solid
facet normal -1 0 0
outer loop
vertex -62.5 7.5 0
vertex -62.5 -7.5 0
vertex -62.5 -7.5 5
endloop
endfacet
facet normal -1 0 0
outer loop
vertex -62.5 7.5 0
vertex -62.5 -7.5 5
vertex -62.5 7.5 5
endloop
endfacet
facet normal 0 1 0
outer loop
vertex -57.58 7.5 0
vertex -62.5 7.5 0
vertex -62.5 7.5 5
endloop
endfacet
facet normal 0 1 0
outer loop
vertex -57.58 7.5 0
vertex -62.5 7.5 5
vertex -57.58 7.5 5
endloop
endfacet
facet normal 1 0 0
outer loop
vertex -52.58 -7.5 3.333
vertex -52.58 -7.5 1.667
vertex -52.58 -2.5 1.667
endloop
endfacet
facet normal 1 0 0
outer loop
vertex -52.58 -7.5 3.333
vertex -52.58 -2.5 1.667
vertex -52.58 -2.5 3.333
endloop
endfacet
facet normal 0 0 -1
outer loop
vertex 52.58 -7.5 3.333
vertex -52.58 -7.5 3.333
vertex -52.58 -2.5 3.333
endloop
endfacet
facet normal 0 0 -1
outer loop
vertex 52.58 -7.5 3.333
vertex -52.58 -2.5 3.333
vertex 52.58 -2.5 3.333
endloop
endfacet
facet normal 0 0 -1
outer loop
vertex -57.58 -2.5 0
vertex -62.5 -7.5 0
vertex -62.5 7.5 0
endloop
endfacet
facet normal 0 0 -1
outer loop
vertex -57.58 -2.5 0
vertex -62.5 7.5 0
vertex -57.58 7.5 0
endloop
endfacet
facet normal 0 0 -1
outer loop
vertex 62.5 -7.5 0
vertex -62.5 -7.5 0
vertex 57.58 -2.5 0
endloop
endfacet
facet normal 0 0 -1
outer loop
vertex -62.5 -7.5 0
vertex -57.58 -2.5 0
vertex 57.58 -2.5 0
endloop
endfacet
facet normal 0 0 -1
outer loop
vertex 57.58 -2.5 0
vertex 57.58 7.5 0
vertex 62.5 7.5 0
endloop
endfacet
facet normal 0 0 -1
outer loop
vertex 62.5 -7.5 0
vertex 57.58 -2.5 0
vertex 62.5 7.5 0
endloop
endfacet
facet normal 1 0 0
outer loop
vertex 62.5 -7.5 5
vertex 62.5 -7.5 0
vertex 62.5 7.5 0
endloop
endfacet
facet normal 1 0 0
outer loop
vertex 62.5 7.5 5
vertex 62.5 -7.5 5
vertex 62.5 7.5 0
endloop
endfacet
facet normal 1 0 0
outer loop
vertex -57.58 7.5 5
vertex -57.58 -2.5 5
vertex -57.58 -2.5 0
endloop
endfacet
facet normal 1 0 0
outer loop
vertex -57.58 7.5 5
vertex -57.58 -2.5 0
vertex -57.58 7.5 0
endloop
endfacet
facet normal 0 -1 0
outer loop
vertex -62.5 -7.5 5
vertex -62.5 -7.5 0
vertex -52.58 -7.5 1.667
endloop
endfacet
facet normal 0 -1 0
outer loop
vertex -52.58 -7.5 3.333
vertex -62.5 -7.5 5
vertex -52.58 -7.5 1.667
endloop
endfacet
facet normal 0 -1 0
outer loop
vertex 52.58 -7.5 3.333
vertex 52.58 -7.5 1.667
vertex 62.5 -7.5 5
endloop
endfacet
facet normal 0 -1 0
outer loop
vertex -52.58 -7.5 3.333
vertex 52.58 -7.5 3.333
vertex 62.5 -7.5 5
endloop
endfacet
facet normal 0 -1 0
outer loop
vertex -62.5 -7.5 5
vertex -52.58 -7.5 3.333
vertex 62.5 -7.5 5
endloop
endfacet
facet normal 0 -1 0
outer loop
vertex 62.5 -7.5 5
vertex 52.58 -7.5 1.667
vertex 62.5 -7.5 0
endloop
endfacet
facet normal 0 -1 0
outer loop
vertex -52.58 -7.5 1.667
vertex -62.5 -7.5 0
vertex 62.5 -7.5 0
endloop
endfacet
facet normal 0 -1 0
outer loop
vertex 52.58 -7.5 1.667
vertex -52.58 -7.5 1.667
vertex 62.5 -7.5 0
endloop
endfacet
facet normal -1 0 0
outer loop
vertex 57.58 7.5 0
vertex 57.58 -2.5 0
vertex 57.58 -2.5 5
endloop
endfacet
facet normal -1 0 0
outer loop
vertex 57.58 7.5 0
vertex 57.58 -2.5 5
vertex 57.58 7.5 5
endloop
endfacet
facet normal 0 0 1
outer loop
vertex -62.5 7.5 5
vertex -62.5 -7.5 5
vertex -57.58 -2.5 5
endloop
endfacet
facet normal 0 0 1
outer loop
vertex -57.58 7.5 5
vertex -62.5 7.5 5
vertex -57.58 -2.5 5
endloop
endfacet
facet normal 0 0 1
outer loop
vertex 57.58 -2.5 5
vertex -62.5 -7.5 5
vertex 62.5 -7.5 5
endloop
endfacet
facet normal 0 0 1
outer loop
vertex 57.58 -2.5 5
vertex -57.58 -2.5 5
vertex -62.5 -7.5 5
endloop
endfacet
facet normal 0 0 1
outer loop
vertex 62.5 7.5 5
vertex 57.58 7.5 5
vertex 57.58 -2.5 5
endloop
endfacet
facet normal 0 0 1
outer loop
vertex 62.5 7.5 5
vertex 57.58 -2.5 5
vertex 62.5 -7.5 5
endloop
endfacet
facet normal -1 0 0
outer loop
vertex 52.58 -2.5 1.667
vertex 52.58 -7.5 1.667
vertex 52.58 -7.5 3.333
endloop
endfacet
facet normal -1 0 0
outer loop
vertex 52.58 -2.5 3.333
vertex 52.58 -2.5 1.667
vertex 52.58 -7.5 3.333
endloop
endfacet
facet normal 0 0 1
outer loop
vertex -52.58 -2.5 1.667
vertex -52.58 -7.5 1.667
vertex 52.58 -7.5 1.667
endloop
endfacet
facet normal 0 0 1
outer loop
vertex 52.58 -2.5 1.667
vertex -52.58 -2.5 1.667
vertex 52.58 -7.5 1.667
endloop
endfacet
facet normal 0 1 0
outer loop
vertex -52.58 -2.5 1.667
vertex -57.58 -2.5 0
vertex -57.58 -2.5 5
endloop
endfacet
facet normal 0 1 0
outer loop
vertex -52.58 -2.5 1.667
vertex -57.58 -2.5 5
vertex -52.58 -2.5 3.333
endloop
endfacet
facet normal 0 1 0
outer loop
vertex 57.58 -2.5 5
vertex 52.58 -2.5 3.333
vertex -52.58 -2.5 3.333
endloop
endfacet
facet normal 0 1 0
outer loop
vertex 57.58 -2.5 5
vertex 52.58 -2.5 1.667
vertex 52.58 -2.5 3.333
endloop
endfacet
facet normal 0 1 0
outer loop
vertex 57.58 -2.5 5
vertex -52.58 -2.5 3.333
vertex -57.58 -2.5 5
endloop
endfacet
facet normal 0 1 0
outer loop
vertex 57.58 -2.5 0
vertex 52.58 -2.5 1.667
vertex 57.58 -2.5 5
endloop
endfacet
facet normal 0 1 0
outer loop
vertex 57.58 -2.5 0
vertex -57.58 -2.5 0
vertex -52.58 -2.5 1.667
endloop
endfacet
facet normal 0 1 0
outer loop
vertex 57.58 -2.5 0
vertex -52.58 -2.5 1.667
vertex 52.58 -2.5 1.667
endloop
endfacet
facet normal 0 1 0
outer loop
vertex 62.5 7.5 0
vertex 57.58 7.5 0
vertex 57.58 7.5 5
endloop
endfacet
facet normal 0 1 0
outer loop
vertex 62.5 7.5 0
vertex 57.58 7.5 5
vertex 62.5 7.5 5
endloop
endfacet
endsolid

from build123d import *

# Parameters (mm, degrees)
SKETCH1_W              = 125
SKETCH1_H              = 15
SKETCH1_W_2            = 115.16
SKETCH1_H_2            = 5
SLIDER_MAIN_BODY_DEPTH = 5
SKETCH5_W              = 105.16
SKETCH5_H              = 1.666666666
CUT_EXTRUDE1_DEPTH     = 65.468984791
SKETCH6_W              = 115.16
SKETCH6_H              = 5
CUT_EXTRUDE2_DEPTH     = 64.146654702


with BuildPart() as part:
    # Sketch1 → Slider Main Body (new body)
    with BuildSketch(Plane.XY):
        Rectangle(SKETCH1_W, SKETCH1_H)
        Rectangle(SKETCH1_W_2, SKETCH1_H_2, mode=Mode.SUBTRACT)
    extrude(amount=SLIDER_MAIN_BODY_DEPTH)

    # Sketch5 → Cut-Extrude1 (cut, through all)
    with BuildSketch(Plane.XZ.offset(7.5)):
        with Locations((0, 2.5)):
            Rectangle(SKETCH5_W, SKETCH5_H)
    extrude(amount=-CUT_EXTRUDE1_DEPTH, mode=Mode.SUBTRACT)

    # Sketch6 → Cut-Extrude2 (cut, through all)
    with BuildSketch(Plane.XY.offset(5)):
        with Locations((0, 5)):
            Rectangle(SKETCH6_W, SKETCH6_H)
    extrude(amount=-CUT_EXTRUDE2_DEPTH, mode=Mode.SUBTRACT)


solid = part.part
